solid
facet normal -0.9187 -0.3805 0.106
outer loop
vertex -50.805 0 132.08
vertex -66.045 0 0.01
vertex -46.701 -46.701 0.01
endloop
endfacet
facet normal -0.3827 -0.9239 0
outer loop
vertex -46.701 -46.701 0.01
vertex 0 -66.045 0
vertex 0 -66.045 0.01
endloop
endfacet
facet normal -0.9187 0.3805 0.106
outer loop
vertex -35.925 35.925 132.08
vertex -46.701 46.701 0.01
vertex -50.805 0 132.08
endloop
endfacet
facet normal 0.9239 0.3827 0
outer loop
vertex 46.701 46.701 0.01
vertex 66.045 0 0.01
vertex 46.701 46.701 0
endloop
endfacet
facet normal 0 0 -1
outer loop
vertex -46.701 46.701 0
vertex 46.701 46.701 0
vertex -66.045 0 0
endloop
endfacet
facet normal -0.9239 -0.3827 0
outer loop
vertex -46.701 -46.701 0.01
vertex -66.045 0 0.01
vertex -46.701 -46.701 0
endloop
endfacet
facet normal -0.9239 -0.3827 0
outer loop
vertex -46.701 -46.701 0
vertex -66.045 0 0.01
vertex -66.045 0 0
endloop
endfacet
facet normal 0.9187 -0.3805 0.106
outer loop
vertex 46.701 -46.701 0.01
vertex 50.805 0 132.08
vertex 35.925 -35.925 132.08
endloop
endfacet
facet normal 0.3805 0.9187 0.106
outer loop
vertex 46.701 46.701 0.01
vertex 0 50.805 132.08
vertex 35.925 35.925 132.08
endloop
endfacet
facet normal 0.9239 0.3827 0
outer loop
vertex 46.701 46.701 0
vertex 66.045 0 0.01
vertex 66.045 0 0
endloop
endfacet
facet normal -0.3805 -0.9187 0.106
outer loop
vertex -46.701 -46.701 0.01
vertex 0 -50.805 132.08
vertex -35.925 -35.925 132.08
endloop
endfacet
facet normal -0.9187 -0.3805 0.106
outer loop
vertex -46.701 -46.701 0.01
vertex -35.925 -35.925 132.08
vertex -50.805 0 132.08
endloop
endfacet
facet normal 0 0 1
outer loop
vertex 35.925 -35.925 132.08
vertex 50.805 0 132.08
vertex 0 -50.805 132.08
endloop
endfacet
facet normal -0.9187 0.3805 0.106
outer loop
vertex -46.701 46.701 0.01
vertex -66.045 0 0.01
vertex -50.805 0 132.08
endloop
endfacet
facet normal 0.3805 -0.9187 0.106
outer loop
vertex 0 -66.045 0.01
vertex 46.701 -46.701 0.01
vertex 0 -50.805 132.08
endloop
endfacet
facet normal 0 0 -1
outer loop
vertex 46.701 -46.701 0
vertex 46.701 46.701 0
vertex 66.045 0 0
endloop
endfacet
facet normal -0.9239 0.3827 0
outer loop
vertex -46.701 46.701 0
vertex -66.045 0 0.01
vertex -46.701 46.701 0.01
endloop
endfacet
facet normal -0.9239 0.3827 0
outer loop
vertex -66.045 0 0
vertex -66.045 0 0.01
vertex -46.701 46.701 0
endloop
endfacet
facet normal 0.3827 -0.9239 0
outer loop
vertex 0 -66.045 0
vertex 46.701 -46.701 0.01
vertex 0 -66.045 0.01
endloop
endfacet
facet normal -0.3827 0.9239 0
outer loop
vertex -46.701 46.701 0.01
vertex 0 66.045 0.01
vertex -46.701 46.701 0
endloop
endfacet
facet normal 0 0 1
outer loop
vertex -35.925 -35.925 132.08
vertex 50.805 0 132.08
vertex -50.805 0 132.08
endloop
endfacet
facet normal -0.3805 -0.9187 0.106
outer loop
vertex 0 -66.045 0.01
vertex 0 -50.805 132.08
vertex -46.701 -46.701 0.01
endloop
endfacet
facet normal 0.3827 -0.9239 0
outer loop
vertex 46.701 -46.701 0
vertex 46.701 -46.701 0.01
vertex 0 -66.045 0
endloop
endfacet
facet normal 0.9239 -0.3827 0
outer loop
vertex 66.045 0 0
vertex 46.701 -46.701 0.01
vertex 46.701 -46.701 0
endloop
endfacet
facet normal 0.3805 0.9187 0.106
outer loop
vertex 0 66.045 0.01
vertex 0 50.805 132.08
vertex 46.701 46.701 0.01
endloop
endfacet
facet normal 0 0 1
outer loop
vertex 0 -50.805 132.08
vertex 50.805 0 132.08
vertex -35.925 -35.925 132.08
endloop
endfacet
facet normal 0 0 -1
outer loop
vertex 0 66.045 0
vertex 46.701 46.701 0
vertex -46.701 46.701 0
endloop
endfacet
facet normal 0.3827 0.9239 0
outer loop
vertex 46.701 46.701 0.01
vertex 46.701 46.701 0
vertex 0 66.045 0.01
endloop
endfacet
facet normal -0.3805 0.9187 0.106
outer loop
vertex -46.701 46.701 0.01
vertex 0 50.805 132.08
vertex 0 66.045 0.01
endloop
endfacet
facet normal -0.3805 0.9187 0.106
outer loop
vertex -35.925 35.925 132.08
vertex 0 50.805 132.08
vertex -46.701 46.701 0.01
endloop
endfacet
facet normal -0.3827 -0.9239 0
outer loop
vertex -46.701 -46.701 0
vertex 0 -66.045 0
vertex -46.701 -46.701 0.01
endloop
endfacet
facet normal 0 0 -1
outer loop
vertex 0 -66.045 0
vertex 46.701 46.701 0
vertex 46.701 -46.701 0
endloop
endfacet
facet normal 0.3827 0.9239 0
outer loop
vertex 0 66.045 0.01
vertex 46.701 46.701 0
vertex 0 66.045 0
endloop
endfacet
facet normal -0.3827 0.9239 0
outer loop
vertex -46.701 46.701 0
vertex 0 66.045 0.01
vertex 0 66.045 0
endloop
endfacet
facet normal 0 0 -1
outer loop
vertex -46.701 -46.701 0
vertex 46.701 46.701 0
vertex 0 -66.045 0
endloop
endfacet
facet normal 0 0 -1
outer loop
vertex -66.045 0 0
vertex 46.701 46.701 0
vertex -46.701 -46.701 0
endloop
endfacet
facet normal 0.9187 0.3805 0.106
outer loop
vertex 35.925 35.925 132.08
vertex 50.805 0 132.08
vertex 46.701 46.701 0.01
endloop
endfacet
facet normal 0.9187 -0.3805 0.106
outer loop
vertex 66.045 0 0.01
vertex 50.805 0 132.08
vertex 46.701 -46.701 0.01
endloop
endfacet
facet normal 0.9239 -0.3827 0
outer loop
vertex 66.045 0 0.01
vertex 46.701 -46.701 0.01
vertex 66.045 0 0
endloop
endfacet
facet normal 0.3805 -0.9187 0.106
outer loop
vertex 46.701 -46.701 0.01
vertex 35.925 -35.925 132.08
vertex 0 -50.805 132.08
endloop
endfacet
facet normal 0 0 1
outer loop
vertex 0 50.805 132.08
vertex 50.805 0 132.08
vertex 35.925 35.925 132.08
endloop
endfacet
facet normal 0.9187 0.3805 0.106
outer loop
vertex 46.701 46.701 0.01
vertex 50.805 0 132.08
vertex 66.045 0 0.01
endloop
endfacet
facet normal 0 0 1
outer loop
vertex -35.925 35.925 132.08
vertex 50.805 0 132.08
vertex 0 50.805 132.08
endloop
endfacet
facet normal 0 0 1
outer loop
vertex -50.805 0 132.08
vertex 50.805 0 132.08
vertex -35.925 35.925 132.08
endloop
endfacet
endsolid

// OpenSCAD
in=25.4;

top=4*in;
base=5.2*in;
height=5.2*in;

zero=0.01;


module slice(points=6,od=base) {
	hull()
	for(z=[0:360/points:359])
	rotate([0,0,z])
	translate([od/2,0])
	circle(d=zero);	
}

hull() {
	translate([0,0,height-zero])
	linear_extrude(height=zero)
	slice(points=8,od=top);
	linear_extrude(height=zero)
	slice(points=8);
}
